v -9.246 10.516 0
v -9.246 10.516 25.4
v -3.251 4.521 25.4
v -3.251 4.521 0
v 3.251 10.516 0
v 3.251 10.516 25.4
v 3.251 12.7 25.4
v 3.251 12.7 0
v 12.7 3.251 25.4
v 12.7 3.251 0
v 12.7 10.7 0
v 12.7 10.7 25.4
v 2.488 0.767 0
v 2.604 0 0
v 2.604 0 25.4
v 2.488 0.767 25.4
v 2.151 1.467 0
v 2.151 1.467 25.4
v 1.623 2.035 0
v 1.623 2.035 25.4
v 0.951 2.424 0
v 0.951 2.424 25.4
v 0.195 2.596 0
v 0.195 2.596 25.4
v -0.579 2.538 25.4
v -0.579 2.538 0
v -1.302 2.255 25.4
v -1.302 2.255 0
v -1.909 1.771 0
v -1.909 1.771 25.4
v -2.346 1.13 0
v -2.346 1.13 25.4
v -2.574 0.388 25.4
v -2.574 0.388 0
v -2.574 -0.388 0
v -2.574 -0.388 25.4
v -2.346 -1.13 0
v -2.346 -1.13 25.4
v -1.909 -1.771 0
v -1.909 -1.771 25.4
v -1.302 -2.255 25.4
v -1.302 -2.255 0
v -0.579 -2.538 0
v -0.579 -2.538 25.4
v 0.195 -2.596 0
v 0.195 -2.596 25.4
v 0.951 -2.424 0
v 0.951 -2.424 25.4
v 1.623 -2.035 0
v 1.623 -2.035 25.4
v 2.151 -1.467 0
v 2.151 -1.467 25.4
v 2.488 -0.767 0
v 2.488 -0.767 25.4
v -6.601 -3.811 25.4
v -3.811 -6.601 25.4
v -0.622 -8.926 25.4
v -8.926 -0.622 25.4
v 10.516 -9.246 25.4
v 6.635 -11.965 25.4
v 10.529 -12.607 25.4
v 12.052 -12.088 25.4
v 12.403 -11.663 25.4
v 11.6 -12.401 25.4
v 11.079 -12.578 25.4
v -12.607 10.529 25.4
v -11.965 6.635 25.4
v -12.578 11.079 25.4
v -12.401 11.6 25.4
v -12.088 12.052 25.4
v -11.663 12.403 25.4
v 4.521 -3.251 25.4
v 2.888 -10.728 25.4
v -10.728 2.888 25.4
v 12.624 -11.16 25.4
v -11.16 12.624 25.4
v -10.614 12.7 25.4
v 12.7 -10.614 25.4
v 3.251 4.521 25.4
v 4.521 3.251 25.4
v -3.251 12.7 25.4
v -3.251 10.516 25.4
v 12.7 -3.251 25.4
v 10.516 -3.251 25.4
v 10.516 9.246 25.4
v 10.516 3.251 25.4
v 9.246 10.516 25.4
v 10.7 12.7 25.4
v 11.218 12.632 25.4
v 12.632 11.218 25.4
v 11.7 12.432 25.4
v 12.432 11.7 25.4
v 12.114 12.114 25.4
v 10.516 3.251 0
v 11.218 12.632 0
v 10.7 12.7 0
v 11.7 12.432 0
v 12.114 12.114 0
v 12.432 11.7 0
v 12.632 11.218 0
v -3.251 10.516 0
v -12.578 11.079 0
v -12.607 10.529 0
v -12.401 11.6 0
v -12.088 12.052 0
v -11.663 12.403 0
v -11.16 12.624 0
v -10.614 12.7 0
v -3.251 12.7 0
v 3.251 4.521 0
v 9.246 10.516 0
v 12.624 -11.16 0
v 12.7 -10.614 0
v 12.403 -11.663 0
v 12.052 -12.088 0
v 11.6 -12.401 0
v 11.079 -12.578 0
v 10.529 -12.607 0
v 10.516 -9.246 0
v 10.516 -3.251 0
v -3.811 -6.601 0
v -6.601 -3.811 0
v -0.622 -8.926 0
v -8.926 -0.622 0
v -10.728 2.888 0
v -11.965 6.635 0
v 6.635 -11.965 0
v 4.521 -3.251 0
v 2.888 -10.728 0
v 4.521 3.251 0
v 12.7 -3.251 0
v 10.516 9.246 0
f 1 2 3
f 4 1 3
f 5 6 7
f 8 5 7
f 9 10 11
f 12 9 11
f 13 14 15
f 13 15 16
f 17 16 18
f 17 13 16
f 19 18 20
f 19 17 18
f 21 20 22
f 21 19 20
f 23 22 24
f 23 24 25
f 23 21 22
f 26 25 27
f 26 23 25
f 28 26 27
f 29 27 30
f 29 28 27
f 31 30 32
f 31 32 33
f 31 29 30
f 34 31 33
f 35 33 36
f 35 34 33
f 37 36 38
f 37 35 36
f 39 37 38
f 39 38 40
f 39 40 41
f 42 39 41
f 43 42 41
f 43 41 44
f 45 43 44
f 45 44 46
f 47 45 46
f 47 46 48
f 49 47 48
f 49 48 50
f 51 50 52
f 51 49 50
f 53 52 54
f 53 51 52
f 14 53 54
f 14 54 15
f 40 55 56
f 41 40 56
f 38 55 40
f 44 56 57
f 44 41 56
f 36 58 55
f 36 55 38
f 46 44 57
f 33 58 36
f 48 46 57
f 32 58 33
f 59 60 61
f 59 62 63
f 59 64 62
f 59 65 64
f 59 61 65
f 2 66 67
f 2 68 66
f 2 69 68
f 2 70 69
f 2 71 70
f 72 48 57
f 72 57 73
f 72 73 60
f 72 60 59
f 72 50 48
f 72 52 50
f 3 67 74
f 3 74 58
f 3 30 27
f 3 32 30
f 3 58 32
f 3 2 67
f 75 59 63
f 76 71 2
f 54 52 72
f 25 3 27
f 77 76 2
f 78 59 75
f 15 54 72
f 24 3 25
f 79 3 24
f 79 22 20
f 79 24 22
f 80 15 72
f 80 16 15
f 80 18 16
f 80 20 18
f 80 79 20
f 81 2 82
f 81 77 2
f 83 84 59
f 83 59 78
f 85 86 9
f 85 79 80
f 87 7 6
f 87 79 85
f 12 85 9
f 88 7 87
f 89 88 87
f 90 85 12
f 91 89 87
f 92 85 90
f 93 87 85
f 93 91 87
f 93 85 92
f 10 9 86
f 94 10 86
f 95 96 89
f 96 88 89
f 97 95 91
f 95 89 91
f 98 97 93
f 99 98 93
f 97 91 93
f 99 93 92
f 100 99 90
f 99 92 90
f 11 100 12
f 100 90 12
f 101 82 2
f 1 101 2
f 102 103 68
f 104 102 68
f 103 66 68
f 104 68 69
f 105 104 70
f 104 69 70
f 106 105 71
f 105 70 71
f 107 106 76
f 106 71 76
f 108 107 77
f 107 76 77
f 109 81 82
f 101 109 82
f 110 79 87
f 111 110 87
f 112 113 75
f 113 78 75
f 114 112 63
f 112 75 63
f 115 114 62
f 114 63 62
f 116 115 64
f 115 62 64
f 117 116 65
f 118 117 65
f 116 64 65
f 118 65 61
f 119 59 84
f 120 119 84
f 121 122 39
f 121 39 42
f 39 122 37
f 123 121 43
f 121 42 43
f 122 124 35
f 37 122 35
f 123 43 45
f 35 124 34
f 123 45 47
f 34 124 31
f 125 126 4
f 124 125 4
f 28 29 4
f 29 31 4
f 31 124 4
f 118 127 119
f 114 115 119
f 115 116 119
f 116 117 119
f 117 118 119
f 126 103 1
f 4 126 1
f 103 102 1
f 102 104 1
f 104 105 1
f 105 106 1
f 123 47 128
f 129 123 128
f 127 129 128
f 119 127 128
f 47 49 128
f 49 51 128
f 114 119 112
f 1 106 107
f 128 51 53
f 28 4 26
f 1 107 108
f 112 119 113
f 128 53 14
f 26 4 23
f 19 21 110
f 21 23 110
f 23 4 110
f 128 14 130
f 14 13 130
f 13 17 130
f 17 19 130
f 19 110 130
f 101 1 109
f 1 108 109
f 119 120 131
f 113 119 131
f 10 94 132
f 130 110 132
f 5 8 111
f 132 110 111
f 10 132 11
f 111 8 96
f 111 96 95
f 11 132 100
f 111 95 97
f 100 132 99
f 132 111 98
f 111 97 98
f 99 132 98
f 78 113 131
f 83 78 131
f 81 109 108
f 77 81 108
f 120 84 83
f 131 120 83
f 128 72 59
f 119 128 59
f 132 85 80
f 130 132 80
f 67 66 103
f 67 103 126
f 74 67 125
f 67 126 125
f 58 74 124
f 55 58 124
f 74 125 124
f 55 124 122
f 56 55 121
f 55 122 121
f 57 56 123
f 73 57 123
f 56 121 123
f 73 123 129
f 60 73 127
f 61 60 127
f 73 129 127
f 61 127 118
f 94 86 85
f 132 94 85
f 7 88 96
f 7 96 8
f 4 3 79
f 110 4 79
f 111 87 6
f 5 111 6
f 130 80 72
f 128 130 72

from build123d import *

# Parameters (mm, degrees)
SKETCH002_R     = 2.6035
PAD001_DEPTH    = 25.4
POCKET001_DEPTH = 25.401
FILLET001_R     = 2


with BuildPart() as part:
    # Sketch002 → Pad001 (new body)
    with BuildSketch(Plane.XY):
        with BuildLine():
            Line((12.7, -12.7), (12.7, 12.7))
            Line((12.7, 12.7), (-12.7, 12.7))
            ThreePointArc((-12.7, 12.7), (-5.260512, -5.260512), (12.7, -12.7))
        make_face()
        Circle(SKETCH002_R, mode=Mode.SUBTRACT)
    extrude(amount=PAD001_DEPTH)

    # Sketch003 (on Face6 of Pad001) → Pocket001 (cut, through all)
    with BuildSketch(Plane.XY.offset(25.4)):
        Polygon((-3.2512, 4.5212), (3.2512, 4.5212), (9.2456, 10.5156), (3.2512, 10.5156), (3.2512, 12.7), (-3.2512, 12.7), (-3.2512, 10.5156), (-9.2456, 10.5156), align=None)
        Polygon((4.5212, 3.2512), (4.5212, -3.2512), (10.5156, -9.2456), (10.5156, -3.2512), (12.7, -3.2512), (12.7, 3.2512), (10.5156, 3.2512), (10.5156, 9.2456), align=None)
    extrude(amount=-POCKET001_DEPTH, mode=Mode.SUBTRACT)

    # Fillet001
    fillet001_edges = [part.edges().sort_by_distance(p)[0] for p in [
        (12.7, 12.7, 12.7),
        (12.7, -12.7, 12.7),
        (-12.7, 12.7, 12.7),
    ]]
    fillet(fillet001_edges, radius=FILLET001_R)


solid = part.part
